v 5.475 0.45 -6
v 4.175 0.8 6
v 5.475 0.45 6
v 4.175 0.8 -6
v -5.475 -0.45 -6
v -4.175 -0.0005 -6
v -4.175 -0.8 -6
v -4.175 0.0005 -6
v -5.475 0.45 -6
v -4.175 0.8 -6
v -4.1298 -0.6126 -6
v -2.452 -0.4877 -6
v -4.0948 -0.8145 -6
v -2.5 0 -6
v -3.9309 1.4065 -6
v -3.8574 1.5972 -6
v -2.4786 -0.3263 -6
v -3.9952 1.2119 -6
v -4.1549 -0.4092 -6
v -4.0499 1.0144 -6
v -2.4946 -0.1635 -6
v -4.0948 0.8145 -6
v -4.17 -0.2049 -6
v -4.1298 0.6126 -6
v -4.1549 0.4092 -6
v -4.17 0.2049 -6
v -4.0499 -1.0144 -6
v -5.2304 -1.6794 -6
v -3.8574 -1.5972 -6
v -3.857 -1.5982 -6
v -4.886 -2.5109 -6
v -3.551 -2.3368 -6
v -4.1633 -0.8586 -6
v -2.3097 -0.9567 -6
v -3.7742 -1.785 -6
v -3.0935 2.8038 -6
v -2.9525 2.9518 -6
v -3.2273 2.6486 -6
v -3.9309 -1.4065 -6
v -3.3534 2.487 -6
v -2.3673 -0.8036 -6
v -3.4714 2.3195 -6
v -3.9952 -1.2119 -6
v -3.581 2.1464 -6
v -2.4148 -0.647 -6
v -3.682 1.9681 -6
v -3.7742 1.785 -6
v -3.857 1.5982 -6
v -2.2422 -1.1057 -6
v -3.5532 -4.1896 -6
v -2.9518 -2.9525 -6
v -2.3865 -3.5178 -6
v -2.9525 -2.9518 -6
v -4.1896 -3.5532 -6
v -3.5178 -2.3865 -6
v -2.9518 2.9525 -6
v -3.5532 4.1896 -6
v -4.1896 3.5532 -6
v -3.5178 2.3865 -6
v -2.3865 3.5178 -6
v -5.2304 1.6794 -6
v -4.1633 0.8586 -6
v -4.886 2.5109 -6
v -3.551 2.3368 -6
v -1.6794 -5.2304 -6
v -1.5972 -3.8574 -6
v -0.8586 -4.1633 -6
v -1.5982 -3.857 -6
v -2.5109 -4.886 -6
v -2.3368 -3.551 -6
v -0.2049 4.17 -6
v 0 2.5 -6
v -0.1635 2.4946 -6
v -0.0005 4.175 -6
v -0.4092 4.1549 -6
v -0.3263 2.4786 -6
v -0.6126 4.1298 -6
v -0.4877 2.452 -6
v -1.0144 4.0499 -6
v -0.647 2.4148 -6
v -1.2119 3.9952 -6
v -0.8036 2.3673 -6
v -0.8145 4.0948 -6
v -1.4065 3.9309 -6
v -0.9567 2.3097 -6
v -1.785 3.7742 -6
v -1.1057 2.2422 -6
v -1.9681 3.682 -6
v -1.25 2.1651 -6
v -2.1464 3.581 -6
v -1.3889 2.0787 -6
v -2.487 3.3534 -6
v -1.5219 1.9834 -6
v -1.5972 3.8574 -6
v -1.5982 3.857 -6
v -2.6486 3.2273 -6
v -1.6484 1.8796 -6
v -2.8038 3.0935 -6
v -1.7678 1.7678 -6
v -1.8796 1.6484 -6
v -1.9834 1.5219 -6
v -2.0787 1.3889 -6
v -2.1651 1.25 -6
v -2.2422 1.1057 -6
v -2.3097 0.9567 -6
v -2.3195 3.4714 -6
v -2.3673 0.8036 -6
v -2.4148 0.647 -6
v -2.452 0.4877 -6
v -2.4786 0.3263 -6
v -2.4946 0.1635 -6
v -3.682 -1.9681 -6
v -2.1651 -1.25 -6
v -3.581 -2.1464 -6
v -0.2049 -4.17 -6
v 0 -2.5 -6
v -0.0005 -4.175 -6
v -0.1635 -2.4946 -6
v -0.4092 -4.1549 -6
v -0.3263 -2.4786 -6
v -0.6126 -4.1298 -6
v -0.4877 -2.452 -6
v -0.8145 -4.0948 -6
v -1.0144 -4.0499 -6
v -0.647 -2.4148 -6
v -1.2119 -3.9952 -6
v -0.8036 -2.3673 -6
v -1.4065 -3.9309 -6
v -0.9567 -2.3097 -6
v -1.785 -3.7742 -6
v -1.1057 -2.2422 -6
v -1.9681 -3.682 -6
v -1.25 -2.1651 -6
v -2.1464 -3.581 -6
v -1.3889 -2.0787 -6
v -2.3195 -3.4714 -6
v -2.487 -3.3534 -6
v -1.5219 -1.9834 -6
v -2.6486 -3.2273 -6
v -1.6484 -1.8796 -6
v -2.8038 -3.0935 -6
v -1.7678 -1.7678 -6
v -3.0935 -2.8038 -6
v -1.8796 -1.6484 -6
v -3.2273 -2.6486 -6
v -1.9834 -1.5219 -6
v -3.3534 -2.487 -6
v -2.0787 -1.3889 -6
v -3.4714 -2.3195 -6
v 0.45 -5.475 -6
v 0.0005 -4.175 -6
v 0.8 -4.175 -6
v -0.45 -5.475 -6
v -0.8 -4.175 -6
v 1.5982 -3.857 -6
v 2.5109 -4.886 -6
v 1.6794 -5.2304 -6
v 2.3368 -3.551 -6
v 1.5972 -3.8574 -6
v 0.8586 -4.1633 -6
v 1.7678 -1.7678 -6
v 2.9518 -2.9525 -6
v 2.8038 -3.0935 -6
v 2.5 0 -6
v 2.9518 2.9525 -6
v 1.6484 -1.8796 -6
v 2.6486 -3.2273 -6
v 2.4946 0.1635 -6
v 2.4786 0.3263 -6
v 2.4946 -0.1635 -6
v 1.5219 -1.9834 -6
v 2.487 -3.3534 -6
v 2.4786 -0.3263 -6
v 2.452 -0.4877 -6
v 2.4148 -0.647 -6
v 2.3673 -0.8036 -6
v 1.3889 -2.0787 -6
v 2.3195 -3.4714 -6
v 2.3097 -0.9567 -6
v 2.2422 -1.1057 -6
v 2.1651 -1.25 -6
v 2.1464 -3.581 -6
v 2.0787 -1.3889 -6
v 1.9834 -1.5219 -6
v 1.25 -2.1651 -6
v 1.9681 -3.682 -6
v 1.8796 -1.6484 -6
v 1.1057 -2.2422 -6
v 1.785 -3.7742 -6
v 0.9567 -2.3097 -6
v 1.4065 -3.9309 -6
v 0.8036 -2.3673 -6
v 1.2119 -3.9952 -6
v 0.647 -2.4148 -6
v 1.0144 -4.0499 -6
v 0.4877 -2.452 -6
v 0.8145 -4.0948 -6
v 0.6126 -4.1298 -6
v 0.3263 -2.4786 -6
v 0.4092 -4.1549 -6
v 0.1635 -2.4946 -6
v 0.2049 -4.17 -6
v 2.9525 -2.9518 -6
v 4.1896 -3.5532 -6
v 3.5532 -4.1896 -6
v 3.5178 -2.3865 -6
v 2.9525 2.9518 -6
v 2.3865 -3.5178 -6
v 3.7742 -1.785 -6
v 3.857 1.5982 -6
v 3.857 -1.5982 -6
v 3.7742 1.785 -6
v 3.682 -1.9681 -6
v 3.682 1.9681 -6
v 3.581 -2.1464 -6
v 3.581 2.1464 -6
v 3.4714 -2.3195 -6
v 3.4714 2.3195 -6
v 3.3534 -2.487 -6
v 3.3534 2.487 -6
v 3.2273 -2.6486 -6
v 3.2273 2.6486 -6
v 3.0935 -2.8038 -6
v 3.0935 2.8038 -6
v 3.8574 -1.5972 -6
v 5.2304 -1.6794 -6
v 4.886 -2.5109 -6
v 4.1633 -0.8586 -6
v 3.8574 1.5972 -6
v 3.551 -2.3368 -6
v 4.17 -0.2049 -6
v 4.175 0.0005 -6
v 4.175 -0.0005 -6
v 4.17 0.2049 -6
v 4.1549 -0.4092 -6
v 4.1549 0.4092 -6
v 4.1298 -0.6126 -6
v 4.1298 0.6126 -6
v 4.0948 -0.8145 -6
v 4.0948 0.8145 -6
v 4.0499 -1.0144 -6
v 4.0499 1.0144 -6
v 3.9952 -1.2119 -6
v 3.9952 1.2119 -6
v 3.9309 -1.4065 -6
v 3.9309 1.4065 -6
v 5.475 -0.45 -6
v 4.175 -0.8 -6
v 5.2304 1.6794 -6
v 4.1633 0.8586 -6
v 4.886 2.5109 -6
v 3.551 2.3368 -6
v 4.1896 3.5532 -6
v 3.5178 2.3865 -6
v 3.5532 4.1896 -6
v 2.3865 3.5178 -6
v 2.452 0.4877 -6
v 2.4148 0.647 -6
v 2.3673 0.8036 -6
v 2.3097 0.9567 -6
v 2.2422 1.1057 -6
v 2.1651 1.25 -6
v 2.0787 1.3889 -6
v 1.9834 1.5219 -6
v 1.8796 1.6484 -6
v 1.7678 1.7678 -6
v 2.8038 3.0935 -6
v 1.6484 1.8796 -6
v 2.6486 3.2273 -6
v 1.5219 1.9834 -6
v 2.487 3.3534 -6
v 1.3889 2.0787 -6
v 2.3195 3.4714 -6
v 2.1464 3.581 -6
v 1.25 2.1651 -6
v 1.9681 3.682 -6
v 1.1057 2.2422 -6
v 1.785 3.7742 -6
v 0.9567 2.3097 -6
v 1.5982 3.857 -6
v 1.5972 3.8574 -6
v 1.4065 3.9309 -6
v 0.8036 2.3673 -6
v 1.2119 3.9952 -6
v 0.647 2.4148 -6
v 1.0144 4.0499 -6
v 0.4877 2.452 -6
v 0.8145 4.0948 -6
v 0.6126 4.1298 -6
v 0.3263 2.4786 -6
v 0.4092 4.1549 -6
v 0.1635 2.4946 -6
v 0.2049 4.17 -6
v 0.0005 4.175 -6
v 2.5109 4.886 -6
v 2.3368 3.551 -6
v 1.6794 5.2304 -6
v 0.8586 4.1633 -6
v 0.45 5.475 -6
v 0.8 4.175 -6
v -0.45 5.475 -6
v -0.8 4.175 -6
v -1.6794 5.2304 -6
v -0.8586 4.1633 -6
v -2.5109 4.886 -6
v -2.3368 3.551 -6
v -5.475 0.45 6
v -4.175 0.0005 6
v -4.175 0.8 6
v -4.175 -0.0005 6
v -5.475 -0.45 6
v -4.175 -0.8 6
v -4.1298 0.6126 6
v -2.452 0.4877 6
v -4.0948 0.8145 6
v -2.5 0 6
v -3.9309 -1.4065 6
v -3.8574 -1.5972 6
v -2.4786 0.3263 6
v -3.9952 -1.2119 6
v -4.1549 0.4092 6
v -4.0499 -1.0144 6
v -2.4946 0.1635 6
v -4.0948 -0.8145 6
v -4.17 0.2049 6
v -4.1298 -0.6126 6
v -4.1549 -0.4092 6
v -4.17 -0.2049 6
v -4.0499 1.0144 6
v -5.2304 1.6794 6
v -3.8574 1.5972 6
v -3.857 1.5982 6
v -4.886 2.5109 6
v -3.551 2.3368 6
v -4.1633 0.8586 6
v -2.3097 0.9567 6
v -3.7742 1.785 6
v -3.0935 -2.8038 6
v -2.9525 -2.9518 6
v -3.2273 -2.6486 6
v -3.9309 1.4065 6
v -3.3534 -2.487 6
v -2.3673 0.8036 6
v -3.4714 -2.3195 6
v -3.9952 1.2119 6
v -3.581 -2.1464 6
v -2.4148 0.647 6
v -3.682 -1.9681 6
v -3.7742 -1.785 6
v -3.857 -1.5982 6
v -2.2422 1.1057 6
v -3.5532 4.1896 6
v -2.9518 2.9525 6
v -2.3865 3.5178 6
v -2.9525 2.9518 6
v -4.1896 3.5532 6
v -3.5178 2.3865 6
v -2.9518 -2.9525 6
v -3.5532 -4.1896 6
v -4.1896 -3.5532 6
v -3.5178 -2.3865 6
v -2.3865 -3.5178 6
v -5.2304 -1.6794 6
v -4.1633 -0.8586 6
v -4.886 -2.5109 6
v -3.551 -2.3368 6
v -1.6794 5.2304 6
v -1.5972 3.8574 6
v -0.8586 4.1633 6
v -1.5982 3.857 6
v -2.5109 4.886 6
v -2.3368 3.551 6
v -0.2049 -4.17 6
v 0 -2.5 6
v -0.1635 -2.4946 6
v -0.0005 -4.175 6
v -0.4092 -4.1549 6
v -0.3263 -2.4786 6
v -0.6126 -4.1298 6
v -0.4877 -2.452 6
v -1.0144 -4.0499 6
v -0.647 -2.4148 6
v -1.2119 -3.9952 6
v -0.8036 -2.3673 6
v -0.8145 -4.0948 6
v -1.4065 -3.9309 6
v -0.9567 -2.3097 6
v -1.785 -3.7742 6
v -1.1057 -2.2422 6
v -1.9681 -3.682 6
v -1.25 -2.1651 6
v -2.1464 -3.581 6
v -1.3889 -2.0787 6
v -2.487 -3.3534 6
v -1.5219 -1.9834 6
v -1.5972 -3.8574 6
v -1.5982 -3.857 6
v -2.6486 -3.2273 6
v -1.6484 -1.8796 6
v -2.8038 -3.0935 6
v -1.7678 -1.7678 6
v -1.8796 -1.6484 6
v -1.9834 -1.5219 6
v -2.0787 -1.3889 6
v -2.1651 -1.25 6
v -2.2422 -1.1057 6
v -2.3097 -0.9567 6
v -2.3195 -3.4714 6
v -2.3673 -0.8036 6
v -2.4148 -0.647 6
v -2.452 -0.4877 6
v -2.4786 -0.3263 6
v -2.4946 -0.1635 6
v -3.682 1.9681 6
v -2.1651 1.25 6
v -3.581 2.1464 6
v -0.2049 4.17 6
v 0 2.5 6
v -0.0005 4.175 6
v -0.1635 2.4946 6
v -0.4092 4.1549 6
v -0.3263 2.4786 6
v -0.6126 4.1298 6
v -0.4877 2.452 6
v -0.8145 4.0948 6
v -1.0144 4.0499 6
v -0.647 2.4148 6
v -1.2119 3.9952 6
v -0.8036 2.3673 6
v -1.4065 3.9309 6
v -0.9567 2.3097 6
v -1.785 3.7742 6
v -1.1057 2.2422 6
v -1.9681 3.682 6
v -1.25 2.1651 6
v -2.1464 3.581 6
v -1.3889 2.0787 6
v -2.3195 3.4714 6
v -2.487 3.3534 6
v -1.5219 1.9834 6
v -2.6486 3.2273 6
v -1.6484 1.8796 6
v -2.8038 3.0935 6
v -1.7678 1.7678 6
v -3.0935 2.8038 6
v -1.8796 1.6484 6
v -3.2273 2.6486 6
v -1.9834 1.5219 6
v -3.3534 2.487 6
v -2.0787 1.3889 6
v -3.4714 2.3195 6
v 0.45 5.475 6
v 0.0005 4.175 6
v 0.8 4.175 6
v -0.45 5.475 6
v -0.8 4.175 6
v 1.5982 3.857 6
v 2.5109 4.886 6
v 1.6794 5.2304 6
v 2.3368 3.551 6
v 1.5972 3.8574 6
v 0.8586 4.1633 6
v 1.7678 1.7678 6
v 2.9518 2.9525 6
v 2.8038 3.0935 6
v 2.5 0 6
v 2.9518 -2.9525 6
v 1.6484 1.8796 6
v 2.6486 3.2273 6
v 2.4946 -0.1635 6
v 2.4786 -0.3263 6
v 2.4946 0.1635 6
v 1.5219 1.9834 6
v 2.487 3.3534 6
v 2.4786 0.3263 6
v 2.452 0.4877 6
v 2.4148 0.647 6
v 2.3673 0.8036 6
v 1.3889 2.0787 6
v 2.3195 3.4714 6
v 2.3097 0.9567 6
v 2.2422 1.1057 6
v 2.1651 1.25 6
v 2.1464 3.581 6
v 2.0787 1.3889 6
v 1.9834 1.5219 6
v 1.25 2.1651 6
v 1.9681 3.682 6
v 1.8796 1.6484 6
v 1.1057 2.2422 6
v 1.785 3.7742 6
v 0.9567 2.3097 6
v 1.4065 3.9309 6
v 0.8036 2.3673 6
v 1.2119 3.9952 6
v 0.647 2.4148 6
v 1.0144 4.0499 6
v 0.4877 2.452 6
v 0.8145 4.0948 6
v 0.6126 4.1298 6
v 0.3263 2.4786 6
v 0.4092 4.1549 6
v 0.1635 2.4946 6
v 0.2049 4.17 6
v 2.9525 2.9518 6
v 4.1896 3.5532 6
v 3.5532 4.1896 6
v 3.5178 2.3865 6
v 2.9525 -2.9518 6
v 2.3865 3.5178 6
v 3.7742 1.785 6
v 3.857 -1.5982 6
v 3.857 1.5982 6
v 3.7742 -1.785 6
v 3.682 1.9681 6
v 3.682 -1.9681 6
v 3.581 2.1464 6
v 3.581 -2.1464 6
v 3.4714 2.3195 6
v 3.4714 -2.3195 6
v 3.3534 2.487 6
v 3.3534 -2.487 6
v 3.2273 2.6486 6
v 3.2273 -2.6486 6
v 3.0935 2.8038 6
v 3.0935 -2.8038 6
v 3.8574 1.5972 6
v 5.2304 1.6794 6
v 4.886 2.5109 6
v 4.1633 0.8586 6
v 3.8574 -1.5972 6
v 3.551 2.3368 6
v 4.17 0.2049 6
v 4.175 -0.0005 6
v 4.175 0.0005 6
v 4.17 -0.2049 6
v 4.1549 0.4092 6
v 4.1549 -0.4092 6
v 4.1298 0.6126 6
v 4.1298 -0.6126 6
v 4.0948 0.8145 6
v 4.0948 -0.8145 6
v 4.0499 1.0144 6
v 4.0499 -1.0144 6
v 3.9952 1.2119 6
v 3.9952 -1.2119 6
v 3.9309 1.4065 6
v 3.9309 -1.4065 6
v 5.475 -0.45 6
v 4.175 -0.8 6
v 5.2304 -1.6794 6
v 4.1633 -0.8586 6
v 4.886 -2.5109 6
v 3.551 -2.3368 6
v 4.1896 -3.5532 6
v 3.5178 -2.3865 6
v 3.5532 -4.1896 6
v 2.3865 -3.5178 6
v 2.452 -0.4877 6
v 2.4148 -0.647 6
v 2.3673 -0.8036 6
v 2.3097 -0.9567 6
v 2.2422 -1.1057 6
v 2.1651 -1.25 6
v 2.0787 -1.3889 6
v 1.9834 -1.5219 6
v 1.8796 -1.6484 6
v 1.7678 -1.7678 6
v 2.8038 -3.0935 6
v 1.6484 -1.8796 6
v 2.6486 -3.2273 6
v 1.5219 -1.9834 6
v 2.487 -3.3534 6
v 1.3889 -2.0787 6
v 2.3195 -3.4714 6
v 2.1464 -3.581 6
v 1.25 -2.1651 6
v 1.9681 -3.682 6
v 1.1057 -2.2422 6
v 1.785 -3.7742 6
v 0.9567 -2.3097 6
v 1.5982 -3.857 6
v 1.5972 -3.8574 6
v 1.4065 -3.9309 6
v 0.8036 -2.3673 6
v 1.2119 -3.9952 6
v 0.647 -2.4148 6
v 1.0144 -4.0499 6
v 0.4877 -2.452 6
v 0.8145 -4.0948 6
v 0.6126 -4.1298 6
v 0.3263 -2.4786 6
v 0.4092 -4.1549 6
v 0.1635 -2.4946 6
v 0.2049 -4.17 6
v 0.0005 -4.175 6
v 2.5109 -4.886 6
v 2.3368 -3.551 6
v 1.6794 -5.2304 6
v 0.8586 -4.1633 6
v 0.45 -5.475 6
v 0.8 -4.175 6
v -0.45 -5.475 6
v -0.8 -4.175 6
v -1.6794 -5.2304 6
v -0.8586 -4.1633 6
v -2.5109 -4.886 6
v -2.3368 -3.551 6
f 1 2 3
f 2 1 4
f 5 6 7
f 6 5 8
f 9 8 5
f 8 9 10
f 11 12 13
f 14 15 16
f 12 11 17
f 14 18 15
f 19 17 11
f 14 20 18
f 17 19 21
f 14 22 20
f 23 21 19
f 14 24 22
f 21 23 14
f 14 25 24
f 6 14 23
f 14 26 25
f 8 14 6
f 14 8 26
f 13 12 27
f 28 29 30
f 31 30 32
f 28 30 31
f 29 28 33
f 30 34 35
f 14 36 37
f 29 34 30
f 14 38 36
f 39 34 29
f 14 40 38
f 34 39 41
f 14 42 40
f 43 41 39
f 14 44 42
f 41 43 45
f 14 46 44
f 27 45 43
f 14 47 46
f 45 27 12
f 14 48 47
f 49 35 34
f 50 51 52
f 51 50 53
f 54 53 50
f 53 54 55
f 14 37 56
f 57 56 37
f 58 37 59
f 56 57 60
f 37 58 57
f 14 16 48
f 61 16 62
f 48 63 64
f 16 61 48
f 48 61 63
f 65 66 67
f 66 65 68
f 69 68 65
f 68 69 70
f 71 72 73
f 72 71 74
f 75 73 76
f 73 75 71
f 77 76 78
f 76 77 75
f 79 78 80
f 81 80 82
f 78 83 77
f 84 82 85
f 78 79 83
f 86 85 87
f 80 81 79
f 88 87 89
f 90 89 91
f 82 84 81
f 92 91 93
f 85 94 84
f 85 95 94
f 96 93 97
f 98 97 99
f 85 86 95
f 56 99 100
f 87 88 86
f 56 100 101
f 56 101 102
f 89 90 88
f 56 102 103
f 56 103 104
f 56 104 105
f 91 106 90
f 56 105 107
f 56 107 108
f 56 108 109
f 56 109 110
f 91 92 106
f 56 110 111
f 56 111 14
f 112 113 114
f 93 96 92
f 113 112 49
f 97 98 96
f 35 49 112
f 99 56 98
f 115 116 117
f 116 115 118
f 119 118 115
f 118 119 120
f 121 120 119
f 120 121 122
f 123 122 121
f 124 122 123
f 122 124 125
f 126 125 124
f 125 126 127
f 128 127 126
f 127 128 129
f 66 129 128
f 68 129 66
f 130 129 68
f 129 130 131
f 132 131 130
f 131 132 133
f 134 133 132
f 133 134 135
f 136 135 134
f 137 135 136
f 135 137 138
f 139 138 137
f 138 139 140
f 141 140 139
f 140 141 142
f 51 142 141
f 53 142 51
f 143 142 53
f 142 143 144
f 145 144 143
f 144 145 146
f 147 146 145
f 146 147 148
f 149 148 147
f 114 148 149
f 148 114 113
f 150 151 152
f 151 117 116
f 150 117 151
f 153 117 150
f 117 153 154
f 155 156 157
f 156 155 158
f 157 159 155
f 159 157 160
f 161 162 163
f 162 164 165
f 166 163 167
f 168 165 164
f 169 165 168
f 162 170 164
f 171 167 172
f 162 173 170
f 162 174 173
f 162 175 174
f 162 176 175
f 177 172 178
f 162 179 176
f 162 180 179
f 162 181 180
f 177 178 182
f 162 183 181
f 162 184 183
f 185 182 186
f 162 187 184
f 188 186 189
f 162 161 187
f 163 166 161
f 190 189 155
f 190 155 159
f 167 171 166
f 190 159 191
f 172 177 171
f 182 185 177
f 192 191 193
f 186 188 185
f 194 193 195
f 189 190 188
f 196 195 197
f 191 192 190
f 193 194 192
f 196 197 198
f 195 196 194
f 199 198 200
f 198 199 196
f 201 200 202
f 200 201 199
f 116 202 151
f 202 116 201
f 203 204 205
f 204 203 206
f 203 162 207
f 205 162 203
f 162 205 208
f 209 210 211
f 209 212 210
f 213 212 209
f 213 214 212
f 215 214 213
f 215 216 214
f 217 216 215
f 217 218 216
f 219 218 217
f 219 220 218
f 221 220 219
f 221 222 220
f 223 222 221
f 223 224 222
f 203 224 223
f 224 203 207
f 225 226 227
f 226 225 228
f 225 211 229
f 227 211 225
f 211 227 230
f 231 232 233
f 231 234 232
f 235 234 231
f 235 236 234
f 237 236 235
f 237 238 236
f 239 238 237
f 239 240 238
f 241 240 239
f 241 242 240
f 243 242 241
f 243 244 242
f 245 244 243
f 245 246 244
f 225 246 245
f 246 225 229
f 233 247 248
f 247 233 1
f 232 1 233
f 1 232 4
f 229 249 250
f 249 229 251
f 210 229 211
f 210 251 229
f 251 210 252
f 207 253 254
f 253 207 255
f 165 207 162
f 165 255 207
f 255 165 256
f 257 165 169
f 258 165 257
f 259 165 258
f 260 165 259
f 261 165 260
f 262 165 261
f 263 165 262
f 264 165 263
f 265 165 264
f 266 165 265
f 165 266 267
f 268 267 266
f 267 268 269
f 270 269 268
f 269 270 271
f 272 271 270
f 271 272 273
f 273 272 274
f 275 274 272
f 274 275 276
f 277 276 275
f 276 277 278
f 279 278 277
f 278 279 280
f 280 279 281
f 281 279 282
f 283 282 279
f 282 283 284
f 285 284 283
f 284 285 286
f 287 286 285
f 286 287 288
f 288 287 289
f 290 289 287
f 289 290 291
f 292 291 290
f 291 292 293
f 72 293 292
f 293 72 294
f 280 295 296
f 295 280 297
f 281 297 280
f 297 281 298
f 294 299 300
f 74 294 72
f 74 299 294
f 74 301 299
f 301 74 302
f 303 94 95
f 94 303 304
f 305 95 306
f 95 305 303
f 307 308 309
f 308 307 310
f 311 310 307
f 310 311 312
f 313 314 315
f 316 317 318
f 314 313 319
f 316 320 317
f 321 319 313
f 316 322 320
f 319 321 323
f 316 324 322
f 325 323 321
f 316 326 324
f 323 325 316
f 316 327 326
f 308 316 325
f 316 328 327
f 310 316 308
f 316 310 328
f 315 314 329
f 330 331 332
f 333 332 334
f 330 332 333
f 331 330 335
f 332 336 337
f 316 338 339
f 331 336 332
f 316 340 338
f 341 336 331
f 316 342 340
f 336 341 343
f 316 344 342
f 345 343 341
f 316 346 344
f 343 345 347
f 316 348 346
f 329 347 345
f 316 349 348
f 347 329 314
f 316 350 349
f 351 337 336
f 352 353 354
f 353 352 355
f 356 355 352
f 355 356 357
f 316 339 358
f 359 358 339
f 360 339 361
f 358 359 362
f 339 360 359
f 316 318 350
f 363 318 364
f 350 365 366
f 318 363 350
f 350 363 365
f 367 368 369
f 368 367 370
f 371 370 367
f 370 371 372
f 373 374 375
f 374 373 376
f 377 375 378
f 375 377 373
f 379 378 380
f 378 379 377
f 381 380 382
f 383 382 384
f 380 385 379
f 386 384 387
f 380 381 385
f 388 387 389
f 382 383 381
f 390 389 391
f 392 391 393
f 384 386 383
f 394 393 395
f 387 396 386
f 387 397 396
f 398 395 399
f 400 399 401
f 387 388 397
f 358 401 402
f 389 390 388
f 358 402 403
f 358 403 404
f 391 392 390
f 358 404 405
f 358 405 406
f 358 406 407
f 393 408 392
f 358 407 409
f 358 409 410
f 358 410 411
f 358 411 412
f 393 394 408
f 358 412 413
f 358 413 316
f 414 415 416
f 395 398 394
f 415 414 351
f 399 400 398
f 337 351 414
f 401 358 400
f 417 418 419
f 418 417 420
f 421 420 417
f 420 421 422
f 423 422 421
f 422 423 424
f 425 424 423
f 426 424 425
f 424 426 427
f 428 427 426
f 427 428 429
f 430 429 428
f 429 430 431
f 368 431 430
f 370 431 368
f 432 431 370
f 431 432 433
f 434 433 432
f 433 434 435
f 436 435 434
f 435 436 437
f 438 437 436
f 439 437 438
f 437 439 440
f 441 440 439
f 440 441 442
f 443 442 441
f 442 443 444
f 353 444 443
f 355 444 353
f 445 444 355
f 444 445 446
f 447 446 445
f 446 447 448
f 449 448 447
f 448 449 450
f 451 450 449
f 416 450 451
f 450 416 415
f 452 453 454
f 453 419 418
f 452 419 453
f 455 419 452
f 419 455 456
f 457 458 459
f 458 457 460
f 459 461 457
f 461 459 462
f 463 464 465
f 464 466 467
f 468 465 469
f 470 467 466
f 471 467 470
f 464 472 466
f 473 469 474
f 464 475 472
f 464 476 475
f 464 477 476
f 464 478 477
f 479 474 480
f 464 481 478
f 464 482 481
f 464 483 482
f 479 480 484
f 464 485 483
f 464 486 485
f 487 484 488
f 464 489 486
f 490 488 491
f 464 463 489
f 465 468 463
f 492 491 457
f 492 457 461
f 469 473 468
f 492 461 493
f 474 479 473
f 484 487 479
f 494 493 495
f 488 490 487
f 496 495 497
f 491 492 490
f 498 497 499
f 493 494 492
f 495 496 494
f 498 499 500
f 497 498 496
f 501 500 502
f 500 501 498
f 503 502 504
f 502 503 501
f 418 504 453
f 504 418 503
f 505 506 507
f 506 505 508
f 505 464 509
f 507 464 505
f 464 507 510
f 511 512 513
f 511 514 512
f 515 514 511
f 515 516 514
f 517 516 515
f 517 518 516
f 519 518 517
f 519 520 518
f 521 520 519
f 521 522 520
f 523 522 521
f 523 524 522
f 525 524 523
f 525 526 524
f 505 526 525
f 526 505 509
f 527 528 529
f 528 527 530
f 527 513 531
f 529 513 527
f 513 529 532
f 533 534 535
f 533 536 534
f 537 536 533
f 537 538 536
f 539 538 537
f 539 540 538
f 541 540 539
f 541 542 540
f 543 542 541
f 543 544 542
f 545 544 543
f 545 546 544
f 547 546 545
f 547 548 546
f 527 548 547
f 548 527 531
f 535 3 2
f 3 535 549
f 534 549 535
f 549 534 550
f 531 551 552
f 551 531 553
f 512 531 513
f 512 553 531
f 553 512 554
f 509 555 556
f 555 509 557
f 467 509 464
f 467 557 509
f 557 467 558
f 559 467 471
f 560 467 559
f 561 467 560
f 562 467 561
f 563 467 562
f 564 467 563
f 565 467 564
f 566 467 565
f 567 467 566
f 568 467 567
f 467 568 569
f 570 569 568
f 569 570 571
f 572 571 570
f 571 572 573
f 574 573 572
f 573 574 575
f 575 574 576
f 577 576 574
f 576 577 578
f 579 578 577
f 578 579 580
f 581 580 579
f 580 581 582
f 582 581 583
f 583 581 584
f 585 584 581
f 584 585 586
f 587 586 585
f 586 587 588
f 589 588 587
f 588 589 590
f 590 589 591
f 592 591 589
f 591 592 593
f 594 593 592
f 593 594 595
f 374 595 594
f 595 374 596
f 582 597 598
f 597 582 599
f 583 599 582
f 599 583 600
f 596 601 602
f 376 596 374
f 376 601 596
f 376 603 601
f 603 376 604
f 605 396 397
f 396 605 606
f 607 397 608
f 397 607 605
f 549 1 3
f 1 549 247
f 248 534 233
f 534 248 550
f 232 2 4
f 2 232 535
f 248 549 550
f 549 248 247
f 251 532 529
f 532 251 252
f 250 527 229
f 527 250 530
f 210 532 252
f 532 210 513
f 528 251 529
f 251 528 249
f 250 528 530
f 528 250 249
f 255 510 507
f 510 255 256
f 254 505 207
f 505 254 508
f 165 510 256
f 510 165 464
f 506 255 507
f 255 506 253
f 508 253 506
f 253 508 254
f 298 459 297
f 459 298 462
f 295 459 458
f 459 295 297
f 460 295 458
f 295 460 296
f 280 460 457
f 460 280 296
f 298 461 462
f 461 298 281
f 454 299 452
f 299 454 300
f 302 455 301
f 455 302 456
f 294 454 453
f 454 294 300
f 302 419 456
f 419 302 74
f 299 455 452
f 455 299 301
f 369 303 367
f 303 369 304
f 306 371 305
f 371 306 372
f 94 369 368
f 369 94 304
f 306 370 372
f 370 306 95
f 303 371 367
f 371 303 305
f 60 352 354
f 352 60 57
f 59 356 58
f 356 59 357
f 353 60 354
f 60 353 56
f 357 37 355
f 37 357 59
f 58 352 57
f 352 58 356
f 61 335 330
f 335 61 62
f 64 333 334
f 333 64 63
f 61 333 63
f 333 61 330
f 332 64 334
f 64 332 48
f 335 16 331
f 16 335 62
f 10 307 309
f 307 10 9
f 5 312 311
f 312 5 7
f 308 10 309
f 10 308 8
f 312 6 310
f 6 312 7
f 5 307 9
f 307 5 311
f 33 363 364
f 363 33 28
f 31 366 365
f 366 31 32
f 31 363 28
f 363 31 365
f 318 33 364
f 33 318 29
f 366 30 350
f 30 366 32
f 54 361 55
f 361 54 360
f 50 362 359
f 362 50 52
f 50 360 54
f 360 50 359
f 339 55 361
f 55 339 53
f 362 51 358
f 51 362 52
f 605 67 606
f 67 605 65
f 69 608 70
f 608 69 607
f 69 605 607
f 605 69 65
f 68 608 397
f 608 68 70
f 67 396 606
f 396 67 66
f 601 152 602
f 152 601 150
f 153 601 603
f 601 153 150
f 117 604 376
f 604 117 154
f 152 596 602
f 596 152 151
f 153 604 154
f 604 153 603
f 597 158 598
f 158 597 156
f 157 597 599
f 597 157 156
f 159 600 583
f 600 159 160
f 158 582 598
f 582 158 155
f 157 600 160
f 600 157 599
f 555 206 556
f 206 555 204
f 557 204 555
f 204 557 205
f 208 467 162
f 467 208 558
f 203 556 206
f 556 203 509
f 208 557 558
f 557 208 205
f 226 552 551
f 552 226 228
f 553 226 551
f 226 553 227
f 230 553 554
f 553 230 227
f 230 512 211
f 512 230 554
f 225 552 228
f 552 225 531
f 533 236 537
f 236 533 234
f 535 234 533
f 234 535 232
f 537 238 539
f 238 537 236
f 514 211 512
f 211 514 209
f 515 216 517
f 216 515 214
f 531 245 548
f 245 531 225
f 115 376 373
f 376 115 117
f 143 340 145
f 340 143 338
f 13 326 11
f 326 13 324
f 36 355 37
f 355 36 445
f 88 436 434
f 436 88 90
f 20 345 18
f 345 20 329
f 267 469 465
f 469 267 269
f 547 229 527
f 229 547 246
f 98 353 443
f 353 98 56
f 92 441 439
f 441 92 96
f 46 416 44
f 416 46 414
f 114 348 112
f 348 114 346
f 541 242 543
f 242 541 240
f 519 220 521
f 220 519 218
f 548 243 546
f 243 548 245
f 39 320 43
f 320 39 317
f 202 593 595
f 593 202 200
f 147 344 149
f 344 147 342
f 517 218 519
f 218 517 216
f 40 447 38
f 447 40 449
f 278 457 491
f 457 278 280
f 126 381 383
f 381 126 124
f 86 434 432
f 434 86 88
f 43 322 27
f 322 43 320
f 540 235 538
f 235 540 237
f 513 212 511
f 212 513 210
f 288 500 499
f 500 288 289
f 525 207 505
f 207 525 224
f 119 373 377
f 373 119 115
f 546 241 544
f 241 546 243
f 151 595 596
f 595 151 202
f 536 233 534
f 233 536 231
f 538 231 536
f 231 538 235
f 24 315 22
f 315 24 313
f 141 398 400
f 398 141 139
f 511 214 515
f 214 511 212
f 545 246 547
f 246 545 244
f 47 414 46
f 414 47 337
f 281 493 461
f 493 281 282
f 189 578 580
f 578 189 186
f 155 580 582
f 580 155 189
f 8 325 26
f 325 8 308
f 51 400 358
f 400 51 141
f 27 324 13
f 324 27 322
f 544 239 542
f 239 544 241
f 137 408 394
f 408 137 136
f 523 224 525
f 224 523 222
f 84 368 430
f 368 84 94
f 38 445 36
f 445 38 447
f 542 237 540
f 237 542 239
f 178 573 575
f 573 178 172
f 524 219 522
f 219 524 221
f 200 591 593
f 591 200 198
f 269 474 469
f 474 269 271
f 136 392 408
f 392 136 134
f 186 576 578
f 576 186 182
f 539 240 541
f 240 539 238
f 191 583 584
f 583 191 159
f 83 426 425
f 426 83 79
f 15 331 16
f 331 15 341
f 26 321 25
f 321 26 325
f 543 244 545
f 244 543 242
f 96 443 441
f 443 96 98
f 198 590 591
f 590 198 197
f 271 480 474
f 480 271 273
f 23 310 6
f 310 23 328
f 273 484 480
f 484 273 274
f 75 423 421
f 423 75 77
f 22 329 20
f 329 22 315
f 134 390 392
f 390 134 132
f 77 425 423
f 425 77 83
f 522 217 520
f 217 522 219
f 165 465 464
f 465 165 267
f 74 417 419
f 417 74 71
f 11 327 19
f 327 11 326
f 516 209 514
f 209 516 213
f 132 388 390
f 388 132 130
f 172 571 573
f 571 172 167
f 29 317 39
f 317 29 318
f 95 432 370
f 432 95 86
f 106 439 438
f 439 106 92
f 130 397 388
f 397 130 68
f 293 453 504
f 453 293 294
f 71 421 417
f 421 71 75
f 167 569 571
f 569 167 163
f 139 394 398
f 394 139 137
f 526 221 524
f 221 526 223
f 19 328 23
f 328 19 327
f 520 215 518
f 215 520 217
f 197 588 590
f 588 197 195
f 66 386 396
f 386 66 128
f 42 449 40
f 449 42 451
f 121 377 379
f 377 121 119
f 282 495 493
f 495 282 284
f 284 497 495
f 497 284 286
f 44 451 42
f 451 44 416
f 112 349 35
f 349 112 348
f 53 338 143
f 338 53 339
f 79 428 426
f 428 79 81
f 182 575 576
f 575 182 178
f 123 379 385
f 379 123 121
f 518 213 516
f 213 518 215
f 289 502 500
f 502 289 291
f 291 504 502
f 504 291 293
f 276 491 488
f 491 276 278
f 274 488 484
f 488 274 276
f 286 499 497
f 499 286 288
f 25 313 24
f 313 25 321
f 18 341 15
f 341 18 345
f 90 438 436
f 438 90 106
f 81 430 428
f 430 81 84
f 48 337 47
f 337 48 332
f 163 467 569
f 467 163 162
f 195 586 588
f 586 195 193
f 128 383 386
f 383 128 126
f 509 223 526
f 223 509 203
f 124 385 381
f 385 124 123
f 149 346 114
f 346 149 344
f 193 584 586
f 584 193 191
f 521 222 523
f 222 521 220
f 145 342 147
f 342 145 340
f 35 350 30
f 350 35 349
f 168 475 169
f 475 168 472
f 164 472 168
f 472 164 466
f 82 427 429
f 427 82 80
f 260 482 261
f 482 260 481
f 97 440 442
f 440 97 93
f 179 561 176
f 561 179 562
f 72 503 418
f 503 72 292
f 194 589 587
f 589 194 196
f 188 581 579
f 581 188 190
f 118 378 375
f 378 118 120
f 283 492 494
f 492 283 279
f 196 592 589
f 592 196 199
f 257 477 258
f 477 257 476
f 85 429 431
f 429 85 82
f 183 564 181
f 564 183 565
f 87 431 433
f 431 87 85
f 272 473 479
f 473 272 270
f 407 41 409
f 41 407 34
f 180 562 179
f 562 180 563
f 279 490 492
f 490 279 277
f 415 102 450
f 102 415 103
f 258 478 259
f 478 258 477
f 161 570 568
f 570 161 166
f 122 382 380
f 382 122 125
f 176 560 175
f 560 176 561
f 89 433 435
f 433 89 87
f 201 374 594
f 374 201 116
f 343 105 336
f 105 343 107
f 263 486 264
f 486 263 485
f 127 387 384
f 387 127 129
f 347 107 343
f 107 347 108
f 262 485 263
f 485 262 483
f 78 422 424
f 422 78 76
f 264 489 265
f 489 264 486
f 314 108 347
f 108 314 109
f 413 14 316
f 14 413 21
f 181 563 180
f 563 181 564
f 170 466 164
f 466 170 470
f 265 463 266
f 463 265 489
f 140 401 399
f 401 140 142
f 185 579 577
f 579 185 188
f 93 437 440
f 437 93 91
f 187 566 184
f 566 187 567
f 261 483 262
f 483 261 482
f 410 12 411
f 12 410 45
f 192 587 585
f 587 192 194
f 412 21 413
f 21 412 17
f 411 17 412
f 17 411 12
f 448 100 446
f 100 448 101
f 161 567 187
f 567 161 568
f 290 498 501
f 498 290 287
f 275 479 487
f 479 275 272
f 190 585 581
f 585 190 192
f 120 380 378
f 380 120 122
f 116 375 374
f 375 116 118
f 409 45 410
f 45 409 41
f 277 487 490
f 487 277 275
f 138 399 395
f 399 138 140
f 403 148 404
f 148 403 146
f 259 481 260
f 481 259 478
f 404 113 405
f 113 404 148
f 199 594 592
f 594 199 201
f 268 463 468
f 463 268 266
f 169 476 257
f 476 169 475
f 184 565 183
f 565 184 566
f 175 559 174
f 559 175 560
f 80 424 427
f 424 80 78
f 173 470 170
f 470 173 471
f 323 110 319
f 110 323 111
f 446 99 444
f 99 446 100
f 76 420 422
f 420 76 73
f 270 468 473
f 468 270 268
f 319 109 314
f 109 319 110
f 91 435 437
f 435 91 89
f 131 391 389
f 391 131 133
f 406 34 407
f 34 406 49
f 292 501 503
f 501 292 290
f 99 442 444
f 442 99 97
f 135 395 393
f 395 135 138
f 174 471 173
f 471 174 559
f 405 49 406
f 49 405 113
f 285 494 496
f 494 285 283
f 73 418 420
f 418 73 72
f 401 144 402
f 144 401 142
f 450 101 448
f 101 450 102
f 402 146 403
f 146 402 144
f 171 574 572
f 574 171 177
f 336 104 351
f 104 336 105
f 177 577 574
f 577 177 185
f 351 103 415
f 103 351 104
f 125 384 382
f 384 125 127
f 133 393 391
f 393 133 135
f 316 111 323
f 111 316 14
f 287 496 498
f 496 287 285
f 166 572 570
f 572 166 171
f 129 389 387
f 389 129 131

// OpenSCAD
$fn=128;

teeth = 16;
pitch_d = 9.75;
pitch_r = pitch_d/2;

pulley_h = 12;
bore_d = 5;

tooth_add = 0.6;
tooth_depth = 0.7;
tooth_tip_w = 0.9;
tooth_root_w = 1.6;

root_r = pitch_r - tooth_depth;
outer_r = pitch_r + tooth_add;

module tooth2d() {
    polygon(points=[
        [root_r, -tooth_root_w/2],
        [root_r,  tooth_root_w/2],
        [outer_r,  tooth_tip_w/2],
        [outer_r, -tooth_tip_w/2]
    ]);
}

module pulley_body() {
    union() {
        cylinder(h=pulley_h, r=root_r, center=true);
        for(i=[0:teeth-1]) {
            rotate([0,0, i*360/teeth])
                linear_extrude(height=pulley_h, center=true)
                    tooth2d();
        }
    }
}

difference() {
    pulley_body();
    cylinder(h=pulley_h+2, d=bore_d, center=true, $fn=96);
}
